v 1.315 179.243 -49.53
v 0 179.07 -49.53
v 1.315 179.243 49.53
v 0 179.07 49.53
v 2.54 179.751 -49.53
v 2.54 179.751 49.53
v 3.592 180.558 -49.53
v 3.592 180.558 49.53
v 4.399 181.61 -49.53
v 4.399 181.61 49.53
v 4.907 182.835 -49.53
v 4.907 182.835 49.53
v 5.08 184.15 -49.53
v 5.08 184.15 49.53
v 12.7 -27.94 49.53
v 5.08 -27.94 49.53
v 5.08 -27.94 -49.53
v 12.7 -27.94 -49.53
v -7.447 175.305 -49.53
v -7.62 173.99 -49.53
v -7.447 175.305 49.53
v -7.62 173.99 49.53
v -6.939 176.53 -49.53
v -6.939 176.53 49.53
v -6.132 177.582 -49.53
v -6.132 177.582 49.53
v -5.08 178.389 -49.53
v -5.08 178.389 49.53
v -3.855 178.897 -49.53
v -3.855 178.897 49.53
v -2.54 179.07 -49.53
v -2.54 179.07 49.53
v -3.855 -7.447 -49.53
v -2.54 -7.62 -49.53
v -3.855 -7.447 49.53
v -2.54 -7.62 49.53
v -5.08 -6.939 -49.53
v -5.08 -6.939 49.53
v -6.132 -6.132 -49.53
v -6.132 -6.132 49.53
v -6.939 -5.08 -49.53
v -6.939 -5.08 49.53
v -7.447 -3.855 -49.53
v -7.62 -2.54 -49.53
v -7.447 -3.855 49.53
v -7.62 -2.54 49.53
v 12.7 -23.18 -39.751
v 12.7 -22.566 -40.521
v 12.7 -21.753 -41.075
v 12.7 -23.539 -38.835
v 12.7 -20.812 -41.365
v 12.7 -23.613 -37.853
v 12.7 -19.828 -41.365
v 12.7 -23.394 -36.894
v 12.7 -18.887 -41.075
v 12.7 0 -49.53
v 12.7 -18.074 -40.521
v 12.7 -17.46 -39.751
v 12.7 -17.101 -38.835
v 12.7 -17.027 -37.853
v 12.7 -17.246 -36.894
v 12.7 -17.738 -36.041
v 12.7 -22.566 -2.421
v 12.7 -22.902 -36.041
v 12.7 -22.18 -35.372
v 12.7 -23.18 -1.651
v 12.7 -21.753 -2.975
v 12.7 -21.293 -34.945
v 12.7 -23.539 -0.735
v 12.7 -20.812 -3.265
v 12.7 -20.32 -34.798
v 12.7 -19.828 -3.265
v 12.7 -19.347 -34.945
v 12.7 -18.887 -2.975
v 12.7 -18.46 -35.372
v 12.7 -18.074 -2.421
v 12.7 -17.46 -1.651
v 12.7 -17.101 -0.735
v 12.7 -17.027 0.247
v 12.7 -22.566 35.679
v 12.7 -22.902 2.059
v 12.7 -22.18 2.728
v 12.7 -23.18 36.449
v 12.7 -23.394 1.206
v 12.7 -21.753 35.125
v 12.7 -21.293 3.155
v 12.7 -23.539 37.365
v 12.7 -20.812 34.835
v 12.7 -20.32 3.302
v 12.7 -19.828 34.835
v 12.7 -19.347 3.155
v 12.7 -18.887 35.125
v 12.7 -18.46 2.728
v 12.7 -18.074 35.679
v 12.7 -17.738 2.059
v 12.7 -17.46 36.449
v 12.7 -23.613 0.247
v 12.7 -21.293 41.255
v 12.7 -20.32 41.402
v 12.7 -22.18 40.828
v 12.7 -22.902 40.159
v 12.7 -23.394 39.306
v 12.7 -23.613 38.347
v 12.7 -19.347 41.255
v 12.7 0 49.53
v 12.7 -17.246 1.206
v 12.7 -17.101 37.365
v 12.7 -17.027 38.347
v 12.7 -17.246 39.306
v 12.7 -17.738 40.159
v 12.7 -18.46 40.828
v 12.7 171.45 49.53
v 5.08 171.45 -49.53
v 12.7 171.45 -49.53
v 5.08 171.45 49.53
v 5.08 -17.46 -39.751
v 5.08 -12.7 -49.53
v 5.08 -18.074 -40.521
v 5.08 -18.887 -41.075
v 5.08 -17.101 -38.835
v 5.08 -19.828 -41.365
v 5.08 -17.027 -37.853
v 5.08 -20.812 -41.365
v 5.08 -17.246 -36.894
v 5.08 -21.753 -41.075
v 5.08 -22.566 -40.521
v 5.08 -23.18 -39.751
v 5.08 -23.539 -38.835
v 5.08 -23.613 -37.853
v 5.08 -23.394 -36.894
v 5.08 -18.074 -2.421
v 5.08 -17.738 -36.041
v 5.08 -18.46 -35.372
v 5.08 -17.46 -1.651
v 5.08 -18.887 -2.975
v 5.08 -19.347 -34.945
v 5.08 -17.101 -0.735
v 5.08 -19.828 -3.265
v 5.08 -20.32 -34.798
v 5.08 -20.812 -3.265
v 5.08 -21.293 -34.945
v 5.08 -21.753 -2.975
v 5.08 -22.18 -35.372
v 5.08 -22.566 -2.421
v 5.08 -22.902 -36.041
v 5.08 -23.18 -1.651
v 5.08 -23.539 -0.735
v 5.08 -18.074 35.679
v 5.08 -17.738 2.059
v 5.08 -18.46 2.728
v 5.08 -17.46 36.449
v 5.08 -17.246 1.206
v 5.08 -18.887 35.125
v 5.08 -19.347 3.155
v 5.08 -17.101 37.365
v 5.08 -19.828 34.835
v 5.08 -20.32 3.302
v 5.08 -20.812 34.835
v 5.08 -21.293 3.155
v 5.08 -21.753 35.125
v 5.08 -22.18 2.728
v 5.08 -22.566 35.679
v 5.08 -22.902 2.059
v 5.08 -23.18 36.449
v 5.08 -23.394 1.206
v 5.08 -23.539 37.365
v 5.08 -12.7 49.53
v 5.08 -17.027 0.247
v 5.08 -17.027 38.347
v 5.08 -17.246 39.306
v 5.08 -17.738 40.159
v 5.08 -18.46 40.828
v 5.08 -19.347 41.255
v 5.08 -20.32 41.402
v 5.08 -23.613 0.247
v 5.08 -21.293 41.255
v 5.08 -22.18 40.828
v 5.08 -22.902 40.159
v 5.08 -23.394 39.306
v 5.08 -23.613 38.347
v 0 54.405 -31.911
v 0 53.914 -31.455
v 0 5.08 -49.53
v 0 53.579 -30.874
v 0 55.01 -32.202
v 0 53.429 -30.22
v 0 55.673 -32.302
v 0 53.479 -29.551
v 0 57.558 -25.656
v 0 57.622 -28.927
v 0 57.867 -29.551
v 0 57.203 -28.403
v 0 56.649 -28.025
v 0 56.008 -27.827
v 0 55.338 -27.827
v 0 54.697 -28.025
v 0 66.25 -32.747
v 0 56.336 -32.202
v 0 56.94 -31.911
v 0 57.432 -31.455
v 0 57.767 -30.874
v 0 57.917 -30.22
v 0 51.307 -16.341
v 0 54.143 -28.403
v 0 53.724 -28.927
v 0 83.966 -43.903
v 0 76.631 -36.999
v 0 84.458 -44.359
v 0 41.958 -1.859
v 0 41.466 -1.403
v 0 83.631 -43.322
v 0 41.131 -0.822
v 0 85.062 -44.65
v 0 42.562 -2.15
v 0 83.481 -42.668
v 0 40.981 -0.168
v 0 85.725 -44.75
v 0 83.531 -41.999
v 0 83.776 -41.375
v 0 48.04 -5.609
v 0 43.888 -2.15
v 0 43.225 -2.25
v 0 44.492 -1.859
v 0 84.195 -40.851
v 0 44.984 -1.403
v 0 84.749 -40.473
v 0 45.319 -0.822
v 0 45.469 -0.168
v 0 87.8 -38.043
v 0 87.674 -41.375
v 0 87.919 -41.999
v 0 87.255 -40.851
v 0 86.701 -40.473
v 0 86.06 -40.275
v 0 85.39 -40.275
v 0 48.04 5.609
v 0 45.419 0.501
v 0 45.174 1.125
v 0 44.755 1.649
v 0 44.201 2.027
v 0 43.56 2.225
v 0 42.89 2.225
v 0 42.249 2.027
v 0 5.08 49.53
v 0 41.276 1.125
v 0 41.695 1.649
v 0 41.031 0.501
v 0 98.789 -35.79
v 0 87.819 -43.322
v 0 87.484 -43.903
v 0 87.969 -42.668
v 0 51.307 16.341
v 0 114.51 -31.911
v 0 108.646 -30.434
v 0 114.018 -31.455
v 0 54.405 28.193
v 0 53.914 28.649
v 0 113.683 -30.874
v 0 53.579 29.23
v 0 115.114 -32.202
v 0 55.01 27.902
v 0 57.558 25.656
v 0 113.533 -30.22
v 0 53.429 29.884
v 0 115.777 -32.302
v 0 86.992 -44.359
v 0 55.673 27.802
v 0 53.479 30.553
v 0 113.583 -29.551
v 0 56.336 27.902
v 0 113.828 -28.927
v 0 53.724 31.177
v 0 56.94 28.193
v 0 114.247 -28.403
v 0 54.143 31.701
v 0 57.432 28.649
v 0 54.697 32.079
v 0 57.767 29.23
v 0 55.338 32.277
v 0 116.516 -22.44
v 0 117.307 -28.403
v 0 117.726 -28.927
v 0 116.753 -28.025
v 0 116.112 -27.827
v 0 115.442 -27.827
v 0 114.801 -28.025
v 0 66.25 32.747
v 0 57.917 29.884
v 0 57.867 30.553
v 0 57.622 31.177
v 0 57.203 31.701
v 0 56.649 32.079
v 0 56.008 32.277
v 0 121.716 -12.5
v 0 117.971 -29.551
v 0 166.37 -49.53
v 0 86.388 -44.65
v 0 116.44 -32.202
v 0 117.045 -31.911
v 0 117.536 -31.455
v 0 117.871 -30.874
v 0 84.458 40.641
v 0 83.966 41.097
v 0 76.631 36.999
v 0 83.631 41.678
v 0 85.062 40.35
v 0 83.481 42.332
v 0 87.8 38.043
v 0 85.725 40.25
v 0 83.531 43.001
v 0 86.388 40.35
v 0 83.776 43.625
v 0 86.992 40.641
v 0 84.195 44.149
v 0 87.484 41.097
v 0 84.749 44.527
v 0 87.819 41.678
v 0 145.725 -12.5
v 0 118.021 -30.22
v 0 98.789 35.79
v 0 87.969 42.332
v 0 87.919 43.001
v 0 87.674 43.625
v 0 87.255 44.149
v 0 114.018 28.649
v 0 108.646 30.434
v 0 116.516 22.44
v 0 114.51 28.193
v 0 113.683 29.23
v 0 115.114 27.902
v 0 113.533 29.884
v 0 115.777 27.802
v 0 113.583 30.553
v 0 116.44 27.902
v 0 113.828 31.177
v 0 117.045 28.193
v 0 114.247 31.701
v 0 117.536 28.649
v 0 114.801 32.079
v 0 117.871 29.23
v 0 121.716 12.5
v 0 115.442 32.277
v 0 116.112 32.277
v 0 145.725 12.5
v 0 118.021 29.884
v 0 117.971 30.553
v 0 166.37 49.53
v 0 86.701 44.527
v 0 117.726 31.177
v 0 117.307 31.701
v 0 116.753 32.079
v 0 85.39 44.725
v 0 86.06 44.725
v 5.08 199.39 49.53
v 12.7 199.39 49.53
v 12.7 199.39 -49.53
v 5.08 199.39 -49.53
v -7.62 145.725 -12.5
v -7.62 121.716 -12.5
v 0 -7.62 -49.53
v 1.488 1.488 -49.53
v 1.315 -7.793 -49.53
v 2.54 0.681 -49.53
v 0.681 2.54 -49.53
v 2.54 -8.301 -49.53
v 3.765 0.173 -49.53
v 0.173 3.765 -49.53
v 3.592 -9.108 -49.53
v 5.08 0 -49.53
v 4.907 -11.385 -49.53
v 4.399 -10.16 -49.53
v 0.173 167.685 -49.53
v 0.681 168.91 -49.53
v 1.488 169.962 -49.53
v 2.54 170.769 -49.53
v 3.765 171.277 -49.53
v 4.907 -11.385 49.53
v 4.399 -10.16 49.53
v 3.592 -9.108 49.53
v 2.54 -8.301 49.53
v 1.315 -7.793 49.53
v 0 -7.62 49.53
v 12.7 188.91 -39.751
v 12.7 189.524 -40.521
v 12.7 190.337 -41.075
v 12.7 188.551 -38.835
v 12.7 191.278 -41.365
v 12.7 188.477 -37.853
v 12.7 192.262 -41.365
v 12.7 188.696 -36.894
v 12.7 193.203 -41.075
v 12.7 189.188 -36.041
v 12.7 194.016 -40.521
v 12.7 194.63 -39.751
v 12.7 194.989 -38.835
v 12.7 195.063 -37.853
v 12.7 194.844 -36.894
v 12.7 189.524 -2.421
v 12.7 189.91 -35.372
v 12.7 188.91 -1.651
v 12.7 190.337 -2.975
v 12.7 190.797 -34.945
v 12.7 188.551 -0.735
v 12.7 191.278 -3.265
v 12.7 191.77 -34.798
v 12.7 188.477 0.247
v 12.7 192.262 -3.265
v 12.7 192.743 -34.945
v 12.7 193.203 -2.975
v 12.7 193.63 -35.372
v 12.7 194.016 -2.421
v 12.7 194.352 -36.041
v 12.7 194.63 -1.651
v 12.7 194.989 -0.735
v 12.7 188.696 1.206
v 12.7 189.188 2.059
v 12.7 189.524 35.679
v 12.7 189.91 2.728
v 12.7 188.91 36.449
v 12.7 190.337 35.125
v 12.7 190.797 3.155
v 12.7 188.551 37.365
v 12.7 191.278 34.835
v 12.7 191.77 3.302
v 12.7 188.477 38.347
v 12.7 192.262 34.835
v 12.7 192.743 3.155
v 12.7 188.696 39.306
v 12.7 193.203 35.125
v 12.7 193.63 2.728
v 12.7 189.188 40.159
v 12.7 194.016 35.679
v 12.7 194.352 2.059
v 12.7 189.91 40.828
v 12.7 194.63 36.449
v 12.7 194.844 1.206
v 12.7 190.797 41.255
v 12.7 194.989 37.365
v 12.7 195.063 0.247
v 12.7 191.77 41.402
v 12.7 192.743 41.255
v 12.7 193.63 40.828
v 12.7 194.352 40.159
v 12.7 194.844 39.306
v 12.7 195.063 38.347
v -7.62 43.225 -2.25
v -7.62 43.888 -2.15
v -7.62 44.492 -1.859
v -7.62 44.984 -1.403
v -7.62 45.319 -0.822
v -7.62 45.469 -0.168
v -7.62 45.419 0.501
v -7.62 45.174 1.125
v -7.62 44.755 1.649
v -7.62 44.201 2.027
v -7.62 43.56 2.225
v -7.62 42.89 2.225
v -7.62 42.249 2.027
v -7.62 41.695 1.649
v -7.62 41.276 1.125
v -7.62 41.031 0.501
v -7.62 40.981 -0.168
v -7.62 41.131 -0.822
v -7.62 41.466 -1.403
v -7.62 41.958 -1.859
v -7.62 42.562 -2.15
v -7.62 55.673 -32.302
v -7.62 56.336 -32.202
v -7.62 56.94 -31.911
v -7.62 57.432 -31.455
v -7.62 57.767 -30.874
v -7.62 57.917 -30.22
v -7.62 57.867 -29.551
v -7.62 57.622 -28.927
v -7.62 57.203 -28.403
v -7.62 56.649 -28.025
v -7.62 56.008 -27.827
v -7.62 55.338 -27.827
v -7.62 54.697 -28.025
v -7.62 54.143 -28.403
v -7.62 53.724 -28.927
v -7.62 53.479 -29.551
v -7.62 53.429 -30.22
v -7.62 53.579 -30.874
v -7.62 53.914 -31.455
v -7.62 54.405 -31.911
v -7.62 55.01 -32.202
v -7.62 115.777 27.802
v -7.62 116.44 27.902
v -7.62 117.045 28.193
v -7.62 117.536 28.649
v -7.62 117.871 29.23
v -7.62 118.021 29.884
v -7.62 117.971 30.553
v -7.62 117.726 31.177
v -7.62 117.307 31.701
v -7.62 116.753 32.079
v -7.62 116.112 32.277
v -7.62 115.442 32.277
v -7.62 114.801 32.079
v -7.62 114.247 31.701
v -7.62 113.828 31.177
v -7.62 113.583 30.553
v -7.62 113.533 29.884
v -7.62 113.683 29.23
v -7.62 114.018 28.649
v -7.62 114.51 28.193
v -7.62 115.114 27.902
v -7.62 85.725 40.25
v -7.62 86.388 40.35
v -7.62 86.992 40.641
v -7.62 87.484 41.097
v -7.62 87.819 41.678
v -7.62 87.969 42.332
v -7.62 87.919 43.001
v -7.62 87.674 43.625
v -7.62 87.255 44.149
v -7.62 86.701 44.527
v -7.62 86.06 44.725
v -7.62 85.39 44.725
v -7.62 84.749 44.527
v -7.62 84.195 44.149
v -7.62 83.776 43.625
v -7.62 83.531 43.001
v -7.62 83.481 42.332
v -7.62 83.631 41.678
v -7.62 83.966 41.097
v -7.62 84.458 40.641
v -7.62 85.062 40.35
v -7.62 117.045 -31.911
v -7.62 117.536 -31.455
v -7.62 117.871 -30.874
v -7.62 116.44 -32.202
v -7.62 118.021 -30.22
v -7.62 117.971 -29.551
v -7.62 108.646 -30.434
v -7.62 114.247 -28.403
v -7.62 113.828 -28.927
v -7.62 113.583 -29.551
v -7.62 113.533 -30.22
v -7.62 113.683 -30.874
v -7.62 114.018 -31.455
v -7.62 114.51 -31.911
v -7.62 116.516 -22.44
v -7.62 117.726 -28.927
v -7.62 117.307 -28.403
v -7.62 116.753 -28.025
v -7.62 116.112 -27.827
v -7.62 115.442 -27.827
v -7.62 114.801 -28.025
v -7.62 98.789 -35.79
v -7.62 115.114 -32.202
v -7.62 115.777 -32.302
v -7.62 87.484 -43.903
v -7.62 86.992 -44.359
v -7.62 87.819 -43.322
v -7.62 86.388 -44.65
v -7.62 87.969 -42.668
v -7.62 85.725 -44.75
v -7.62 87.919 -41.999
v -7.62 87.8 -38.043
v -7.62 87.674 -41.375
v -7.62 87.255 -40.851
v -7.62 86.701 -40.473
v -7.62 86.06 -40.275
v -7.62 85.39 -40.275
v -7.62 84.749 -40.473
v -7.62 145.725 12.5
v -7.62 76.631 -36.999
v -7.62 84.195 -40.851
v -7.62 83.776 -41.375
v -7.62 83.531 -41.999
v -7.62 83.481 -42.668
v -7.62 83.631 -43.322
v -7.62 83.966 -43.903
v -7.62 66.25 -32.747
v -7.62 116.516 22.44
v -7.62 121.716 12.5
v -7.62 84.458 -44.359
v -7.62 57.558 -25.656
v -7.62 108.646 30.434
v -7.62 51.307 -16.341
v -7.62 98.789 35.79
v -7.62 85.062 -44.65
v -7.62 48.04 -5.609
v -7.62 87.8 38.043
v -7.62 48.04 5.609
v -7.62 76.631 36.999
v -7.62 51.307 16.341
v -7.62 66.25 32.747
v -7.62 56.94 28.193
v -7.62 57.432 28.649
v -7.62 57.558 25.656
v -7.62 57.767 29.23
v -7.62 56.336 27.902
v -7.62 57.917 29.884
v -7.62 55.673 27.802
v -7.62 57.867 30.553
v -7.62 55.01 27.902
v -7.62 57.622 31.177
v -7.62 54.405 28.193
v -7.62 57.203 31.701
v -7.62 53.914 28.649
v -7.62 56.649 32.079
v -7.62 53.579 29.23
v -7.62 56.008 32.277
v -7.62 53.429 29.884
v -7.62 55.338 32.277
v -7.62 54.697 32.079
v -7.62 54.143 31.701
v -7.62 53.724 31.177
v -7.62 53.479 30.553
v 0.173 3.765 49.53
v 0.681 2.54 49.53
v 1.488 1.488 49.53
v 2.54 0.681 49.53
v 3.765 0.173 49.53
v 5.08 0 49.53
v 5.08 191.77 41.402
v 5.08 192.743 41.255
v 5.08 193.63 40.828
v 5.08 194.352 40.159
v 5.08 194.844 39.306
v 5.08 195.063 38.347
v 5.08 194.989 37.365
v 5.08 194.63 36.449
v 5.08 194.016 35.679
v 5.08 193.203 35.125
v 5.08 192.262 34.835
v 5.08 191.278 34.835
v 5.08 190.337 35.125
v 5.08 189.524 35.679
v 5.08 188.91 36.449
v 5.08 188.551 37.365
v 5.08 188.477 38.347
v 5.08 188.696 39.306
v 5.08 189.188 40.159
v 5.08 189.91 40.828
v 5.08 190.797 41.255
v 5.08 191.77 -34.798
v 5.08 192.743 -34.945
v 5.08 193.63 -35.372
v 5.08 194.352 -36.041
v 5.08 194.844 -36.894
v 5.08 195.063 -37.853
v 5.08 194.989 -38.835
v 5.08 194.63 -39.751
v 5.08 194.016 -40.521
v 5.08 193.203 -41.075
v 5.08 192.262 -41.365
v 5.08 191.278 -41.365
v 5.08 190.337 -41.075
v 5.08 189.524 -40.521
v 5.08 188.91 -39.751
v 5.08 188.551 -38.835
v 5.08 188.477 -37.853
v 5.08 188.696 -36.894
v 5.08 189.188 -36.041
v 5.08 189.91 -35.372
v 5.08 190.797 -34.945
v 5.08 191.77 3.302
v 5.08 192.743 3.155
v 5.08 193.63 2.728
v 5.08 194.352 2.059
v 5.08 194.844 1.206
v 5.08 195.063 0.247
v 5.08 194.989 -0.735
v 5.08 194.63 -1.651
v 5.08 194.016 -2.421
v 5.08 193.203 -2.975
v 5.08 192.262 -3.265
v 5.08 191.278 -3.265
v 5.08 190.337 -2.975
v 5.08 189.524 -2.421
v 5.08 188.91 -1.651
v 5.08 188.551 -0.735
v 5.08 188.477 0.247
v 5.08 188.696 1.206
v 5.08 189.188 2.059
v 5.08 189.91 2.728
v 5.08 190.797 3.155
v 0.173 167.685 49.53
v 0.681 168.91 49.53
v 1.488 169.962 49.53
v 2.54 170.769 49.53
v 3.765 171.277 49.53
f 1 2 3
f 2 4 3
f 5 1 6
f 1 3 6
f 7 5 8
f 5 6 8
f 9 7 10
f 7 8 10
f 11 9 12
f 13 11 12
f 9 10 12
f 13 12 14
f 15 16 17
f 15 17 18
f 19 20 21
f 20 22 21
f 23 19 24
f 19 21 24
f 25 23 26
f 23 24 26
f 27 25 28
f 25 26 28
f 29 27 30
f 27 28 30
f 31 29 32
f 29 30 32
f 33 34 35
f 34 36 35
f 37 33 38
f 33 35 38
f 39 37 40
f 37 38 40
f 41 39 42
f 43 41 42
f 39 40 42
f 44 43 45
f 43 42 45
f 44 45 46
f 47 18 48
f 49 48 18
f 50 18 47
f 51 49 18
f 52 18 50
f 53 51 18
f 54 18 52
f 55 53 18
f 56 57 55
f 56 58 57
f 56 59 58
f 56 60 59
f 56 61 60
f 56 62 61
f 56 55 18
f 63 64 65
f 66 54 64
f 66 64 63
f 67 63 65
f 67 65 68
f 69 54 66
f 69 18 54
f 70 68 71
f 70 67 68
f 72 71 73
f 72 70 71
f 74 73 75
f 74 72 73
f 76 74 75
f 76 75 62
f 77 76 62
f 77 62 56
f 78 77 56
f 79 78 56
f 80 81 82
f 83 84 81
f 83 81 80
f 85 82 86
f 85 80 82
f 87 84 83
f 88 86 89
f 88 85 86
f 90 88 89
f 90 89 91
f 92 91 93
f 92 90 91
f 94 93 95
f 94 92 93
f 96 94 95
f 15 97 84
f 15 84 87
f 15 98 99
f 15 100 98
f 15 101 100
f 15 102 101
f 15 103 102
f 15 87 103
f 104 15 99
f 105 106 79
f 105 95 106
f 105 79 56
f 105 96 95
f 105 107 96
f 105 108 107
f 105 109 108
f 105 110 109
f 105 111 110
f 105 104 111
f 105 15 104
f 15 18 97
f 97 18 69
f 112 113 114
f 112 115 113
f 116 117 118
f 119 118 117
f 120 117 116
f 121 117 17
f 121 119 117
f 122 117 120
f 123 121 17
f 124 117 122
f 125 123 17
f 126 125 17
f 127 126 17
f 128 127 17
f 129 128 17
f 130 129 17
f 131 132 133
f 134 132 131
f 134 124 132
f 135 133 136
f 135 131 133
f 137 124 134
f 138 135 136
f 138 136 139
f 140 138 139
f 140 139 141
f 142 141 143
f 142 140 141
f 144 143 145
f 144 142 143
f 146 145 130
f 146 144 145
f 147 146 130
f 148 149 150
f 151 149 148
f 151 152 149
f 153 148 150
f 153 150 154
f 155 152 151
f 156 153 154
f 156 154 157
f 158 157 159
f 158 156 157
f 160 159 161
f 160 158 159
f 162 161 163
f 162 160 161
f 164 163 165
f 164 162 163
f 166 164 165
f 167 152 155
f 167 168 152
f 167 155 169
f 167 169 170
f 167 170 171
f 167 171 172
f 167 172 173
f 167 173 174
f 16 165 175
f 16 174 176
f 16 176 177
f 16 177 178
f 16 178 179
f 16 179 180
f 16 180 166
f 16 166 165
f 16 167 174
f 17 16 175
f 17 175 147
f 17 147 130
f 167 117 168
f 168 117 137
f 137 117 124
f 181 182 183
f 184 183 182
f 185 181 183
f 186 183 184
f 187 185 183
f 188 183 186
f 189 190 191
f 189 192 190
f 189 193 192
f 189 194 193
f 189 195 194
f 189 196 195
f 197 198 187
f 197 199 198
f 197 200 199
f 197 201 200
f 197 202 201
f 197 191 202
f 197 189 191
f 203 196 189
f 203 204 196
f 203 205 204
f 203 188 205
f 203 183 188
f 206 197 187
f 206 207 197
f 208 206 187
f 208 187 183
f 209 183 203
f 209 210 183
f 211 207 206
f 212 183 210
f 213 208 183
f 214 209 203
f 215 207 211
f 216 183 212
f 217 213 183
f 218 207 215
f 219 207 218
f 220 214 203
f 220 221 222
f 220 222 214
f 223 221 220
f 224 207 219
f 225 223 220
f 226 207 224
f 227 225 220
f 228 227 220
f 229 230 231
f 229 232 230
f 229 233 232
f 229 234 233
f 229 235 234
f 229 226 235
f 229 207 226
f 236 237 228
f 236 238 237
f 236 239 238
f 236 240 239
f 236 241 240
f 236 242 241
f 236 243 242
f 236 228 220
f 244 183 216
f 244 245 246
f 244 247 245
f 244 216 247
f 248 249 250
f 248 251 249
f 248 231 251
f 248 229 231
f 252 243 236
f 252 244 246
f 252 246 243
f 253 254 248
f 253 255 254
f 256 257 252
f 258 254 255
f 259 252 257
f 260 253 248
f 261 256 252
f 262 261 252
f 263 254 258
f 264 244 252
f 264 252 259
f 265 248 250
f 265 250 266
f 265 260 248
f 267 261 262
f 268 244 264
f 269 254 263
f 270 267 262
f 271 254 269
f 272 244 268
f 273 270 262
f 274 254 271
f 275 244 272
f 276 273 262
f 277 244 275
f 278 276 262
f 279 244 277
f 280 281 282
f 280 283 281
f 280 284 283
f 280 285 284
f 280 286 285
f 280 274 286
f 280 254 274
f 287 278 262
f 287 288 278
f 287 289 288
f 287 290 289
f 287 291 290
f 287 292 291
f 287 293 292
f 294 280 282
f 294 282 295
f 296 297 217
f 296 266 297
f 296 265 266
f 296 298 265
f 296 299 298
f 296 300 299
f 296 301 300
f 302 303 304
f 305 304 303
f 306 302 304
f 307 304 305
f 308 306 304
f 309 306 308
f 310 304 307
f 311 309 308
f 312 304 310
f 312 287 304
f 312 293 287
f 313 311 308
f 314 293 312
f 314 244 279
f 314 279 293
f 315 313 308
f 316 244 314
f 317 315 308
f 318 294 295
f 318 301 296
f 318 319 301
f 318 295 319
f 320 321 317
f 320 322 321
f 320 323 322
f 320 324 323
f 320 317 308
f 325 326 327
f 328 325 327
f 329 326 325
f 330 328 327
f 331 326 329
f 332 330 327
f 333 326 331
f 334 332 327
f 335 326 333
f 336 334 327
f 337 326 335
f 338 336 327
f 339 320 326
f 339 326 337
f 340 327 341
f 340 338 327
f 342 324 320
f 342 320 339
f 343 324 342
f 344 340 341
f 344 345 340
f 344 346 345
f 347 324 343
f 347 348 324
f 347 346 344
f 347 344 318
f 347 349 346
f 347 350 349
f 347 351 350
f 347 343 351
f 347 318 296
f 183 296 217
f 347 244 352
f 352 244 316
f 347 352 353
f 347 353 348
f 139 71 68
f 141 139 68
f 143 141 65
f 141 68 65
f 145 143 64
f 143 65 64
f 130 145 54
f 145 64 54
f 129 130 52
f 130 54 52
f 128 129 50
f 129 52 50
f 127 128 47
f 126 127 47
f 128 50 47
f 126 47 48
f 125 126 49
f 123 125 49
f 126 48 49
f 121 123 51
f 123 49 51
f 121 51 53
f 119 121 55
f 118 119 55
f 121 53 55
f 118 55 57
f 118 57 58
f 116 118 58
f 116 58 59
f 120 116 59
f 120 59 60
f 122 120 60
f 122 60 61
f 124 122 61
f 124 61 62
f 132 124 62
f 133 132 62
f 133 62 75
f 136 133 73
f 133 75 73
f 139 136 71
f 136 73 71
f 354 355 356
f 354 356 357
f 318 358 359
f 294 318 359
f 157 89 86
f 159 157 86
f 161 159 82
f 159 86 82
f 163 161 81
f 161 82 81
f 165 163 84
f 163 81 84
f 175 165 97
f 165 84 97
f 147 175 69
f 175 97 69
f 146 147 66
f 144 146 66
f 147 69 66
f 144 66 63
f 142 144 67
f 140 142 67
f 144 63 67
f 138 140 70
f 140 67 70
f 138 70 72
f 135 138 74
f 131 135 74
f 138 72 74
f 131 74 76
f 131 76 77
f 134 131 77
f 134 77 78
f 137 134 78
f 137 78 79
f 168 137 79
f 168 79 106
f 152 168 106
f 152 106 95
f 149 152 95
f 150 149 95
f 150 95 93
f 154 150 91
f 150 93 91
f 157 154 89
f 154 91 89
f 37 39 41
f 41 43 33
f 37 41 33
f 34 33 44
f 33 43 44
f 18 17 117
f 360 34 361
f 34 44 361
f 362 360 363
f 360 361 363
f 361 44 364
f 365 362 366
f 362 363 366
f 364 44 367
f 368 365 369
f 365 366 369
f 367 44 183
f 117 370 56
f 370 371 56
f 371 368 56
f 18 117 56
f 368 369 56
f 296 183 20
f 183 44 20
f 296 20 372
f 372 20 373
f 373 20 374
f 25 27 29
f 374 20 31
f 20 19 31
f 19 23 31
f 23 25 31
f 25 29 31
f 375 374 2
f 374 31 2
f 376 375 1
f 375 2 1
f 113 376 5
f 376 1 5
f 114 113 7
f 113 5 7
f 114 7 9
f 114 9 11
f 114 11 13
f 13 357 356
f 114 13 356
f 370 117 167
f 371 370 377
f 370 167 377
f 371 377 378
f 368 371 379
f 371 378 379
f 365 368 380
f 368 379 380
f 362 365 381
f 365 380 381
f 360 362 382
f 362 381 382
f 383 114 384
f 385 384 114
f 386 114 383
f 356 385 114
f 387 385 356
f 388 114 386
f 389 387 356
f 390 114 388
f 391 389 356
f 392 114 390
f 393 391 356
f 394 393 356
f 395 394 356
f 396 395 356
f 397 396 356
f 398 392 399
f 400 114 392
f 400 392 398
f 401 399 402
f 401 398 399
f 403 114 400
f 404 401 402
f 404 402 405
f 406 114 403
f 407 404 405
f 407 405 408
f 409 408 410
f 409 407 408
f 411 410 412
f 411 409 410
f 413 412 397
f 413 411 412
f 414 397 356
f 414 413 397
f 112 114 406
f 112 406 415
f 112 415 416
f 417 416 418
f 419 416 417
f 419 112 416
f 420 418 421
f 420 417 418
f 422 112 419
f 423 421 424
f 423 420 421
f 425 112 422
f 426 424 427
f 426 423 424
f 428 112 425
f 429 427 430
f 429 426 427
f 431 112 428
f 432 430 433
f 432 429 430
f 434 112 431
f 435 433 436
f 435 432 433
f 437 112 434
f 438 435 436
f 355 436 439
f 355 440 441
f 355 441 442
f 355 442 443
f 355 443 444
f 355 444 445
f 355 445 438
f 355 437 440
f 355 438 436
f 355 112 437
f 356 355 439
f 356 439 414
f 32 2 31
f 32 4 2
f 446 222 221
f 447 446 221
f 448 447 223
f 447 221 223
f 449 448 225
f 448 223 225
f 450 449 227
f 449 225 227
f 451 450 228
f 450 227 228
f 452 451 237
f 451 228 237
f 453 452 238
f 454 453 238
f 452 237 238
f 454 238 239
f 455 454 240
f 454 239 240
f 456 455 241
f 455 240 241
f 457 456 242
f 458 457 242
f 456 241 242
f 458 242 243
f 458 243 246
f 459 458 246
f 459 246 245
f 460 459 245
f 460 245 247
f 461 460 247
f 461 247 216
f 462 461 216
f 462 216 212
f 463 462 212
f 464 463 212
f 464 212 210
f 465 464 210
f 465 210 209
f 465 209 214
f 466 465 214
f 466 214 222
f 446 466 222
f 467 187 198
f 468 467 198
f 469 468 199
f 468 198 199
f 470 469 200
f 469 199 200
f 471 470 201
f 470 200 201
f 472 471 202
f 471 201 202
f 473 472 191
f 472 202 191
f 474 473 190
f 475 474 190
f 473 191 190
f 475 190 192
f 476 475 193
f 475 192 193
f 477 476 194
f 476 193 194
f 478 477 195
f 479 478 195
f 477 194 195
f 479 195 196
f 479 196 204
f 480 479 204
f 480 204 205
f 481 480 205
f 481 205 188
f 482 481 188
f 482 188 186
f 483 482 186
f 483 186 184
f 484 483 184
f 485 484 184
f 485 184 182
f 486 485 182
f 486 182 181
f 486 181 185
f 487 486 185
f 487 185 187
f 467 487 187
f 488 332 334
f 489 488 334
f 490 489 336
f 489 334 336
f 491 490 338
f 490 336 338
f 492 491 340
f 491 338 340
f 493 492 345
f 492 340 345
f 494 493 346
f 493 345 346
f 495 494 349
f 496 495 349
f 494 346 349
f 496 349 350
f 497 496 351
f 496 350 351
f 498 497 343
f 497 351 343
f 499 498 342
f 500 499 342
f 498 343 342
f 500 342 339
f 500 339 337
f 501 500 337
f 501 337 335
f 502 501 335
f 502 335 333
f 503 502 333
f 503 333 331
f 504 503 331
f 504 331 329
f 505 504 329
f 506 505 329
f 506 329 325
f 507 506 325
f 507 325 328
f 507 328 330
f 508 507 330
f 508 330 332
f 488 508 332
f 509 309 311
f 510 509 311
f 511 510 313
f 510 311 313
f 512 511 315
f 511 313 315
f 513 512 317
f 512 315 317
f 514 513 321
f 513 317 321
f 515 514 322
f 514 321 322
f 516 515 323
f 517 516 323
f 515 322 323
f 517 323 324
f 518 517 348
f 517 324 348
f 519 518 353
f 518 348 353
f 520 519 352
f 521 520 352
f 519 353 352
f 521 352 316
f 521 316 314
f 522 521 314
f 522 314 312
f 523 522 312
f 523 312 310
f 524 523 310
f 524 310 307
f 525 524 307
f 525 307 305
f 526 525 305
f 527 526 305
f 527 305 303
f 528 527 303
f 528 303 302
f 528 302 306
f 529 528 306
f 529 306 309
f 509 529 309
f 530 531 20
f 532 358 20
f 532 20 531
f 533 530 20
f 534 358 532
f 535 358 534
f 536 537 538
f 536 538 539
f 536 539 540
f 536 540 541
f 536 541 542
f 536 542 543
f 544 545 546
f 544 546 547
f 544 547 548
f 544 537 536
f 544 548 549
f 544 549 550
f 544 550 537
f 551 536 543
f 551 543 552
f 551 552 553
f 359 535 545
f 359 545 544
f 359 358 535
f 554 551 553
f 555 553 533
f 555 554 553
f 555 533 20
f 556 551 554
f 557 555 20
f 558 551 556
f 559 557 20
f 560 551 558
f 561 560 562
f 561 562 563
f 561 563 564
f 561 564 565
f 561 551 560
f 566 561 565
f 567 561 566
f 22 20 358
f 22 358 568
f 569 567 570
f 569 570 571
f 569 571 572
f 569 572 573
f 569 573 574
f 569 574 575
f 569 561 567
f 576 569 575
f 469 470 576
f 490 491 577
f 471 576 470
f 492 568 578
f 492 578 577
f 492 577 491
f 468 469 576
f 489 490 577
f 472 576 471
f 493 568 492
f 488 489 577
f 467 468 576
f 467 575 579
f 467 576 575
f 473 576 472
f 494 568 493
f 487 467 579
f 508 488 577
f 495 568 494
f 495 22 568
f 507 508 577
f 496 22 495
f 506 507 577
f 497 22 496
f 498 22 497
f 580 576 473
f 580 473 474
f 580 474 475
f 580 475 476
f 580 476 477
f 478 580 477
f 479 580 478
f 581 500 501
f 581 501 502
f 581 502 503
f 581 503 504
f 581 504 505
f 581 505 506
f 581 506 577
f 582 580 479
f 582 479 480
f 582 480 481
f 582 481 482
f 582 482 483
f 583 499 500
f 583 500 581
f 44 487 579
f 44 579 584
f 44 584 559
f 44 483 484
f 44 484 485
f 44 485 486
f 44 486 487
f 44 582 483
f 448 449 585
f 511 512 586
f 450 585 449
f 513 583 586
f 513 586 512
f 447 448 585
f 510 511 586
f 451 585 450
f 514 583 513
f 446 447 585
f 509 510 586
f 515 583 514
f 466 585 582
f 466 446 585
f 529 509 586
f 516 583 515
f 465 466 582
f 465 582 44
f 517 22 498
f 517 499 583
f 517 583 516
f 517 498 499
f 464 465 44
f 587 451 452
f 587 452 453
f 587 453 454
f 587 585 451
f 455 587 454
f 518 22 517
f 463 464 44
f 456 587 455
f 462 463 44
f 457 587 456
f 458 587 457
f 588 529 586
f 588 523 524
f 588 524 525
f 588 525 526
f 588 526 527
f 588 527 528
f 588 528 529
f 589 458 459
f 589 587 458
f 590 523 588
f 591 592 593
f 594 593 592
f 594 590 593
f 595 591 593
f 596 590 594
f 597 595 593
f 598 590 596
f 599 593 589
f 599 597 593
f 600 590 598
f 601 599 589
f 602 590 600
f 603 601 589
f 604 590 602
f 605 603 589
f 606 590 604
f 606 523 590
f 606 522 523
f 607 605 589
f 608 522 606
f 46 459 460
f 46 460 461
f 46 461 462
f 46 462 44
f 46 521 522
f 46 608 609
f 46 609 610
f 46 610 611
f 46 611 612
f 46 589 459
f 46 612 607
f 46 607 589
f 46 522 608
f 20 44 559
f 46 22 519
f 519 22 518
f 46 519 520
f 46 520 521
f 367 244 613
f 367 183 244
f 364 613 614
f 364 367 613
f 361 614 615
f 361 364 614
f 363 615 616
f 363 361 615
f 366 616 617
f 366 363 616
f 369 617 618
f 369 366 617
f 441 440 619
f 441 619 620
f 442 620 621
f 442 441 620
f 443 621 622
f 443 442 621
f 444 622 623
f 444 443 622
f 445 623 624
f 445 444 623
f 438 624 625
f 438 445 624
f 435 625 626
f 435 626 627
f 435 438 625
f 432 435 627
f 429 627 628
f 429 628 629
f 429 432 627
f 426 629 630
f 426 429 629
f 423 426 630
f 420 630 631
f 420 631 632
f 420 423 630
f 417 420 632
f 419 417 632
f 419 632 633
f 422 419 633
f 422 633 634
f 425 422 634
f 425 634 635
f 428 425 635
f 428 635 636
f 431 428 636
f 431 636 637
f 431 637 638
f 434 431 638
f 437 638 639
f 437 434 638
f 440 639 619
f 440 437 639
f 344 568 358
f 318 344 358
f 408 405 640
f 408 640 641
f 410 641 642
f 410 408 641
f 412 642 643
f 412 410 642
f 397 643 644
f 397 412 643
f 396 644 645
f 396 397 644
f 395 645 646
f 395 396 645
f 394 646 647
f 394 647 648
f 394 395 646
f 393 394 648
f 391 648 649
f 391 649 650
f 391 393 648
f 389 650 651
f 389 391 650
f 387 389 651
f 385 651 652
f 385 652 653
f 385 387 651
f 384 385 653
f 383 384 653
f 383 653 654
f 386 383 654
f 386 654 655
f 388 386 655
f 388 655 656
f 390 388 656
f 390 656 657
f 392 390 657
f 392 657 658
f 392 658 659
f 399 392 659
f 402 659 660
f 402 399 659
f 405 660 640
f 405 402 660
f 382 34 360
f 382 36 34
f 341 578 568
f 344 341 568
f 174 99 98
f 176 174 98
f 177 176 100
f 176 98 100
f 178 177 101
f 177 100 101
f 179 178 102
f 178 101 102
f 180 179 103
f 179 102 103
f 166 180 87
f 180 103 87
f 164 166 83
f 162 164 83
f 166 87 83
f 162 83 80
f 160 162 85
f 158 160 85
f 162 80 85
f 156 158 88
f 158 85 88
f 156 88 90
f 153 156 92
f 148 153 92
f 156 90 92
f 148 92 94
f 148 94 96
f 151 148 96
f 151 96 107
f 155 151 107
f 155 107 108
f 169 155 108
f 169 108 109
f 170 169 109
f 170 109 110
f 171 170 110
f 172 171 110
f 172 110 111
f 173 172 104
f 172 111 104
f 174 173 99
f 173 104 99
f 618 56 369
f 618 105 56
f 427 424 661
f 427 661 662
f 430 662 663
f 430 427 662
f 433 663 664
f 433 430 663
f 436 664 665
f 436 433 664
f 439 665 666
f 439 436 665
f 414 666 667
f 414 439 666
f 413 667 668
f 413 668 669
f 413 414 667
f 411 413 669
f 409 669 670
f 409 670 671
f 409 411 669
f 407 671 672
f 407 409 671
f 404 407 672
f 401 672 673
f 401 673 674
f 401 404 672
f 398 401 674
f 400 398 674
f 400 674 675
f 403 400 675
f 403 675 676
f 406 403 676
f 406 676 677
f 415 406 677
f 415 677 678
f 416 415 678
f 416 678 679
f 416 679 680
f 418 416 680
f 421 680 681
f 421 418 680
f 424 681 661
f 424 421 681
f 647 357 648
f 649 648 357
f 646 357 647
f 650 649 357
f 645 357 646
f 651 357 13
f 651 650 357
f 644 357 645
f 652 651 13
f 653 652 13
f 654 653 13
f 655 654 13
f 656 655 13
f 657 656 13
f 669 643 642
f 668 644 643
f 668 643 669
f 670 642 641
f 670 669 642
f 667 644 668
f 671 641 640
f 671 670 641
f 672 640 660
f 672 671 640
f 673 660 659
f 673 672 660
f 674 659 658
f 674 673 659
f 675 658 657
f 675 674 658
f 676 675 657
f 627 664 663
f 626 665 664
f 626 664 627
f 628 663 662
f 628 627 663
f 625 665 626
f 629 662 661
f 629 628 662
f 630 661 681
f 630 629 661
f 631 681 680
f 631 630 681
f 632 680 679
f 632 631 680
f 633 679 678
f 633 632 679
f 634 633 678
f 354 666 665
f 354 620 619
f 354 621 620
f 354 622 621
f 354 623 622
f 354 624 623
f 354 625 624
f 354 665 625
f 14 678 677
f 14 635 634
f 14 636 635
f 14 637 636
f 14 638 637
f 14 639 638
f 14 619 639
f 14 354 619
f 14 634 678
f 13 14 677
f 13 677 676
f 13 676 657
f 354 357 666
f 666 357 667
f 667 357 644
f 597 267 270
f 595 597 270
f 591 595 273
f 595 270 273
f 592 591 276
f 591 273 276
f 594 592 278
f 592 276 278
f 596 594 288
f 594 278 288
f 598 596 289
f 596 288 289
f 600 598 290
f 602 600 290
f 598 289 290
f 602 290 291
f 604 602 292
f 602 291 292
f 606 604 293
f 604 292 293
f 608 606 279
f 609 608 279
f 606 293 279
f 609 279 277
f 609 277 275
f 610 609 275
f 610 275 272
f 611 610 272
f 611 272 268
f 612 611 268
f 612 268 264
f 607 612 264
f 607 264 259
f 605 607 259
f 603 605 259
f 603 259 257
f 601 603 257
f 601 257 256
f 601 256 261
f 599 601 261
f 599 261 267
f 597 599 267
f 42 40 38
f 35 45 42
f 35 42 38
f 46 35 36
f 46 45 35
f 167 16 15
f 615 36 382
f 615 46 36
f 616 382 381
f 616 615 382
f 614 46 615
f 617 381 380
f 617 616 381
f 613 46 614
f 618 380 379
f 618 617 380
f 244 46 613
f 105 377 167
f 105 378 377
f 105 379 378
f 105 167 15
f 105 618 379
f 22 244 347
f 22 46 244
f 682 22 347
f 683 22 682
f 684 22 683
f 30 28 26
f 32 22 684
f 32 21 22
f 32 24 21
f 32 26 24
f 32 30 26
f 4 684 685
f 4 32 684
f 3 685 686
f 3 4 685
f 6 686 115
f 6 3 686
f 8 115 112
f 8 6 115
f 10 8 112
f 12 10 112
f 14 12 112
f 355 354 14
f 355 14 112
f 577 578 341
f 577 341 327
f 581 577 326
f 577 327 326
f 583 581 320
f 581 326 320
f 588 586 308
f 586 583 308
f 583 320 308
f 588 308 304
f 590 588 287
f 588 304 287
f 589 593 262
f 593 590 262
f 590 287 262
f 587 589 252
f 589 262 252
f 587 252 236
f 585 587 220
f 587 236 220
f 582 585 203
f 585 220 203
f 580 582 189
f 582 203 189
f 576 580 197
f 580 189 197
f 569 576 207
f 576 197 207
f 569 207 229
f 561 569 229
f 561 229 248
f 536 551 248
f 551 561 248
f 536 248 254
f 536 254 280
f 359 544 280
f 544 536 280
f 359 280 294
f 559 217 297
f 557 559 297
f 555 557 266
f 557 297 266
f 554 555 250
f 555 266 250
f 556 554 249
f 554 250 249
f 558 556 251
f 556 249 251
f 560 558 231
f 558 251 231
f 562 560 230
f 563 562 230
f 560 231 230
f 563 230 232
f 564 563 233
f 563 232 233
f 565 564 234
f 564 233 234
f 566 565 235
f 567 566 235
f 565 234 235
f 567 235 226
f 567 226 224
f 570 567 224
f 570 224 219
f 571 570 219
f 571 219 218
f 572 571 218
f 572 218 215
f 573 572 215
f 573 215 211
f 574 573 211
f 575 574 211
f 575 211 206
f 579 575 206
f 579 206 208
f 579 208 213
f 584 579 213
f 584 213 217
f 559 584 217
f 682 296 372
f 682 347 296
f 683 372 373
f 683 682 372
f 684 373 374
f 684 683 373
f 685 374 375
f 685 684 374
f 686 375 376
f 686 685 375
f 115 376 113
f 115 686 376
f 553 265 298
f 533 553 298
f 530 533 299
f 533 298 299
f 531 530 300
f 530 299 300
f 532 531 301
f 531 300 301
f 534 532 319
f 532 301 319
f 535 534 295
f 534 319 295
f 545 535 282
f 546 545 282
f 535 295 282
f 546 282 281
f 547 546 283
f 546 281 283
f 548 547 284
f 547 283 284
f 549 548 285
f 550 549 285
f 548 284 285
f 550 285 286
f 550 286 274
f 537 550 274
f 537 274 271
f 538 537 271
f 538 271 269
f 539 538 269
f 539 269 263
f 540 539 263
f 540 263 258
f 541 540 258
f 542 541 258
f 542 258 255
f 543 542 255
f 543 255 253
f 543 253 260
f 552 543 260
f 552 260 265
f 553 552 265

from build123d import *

# Parameters (mm, degrees)
BOSS_EXTRUDE1_DEPTH = 49.53
FILLET1_R           = 5.08
SKETCH7_R           = 2.2499955
SKETCH7_R_2         = 38.1
CUT_EXTRUDE1_DEPTH  = 26.67
CUT_EXTRUDE2_START  = -7.62
SKETCH8_R           = 3.302
CUT_EXTRUDE2_DEPTH  = 7.62
CUT_EXTRUDE3_DEPTH  = 7.62


with BuildPart() as part:
    # Sketch1 → Boss-Extrude1 (new body, symmetric)
    with BuildSketch(Plane.XY):
        Polygon((0, 0), (0, 171.45), (12.7, 171.45), (12.7, 179.07), (12.7, 199.39), (5.08, 199.39), (5.08, 179.07), (-7.62, 179.07), (-7.62, 171.45), (-7.62, -7.62), (5.08, -7.62), (5.08, -27.94), (12.7, -27.94), (12.7, -7.62), (12.7, 0), align=None)
    extrude(amount=BOSS_EXTRUDE1_DEPTH, both=True)

    # Fillet1
    fillet1_edges = [part.edges().sort_by_distance(p)[0] for p in [
        (5.08, -7.62, 0),
        (-7.62, -7.62, 0),
        (-7.62, 179.07, 0),
        (5.08, 179.07, 0),
        (0, 171.45, 0),
        (0, 0, 0),
    ]]
    fillet(fillet1_edges, radius=FILLET1_R)

    # Sketch7 → Cut-Extrude1 (cut)
    with BuildSketch(Plane(origin=(0, 0, 0), x_dir=(0, 0, -1), z_dir=(1, 0, 0))):
        with Locations((-42.5, 85.725)):
            Circle(SKETCH7_R)
        with Locations((-30.0520382, 115.7770382)):
            Circle(SKETCH7_R)
        with Locations((0, 128.225)):
            Circle(SKETCH7_R)
        with Locations((30.0520382, 115.7770382)):
            Circle(SKETCH7_R)
        with Locations((42.5, 85.725)):
            Circle(SKETCH7_R)
        with Locations((30.0520382, 55.6729618)):
            Circle(SKETCH7_R)
        with Locations((0, 43.225)):
            Circle(SKETCH7_R)
        with Locations((-30.0520382, 55.6729618)):
            Circle(SKETCH7_R)
        with Locations((0, 85.725)):
            Circle(SKETCH7_R_2)
    extrude(amount=-CUT_EXTRUDE1_DEPTH, mode=Mode.SUBTRACT)

    # Sketch8 → Cut-Extrude2 (cut)
    with BuildSketch(Plane.ZY.offset(-5.08).offset(CUT_EXTRUDE2_START)):
        with Locations((-38.1, 191.77)):
            Circle(SKETCH8_R)
        with Locations((0, 191.77)):
            Circle(SKETCH8_R)
        with Locations((38.1, 191.77)):
            Circle(SKETCH8_R)
    cut_extrude2 = extrude(amount=CUT_EXTRUDE2_DEPTH, mode=Mode.SUBTRACT)

    # Mirror1: Cut-Extrude2 across plane
    add(cut_extrude2.mirror(Plane.ZX.offset(85.725)), mode=Mode.SUBTRACT)

    # Sketch14 → Cut-Extrude3 (cut)
    with BuildSketch(Plane.ZY.offset(7.62)):
        with BuildLine():
            Line((12.5, 121.716110013), (12.5, 145.725))
            Line((12.5, 145.725), (-12.5, 145.725))
            Line((-12.5, 145.725), (-12.5, 121.716110013))
            ThreePointArc((-12.5, 121.716110013), (0, 123.825), (12.5, 121.716110013))
        make_face()
    extrude(amount=-CUT_EXTRUDE3_DEPTH, mode=Mode.SUBTRACT)


solid = part.part
